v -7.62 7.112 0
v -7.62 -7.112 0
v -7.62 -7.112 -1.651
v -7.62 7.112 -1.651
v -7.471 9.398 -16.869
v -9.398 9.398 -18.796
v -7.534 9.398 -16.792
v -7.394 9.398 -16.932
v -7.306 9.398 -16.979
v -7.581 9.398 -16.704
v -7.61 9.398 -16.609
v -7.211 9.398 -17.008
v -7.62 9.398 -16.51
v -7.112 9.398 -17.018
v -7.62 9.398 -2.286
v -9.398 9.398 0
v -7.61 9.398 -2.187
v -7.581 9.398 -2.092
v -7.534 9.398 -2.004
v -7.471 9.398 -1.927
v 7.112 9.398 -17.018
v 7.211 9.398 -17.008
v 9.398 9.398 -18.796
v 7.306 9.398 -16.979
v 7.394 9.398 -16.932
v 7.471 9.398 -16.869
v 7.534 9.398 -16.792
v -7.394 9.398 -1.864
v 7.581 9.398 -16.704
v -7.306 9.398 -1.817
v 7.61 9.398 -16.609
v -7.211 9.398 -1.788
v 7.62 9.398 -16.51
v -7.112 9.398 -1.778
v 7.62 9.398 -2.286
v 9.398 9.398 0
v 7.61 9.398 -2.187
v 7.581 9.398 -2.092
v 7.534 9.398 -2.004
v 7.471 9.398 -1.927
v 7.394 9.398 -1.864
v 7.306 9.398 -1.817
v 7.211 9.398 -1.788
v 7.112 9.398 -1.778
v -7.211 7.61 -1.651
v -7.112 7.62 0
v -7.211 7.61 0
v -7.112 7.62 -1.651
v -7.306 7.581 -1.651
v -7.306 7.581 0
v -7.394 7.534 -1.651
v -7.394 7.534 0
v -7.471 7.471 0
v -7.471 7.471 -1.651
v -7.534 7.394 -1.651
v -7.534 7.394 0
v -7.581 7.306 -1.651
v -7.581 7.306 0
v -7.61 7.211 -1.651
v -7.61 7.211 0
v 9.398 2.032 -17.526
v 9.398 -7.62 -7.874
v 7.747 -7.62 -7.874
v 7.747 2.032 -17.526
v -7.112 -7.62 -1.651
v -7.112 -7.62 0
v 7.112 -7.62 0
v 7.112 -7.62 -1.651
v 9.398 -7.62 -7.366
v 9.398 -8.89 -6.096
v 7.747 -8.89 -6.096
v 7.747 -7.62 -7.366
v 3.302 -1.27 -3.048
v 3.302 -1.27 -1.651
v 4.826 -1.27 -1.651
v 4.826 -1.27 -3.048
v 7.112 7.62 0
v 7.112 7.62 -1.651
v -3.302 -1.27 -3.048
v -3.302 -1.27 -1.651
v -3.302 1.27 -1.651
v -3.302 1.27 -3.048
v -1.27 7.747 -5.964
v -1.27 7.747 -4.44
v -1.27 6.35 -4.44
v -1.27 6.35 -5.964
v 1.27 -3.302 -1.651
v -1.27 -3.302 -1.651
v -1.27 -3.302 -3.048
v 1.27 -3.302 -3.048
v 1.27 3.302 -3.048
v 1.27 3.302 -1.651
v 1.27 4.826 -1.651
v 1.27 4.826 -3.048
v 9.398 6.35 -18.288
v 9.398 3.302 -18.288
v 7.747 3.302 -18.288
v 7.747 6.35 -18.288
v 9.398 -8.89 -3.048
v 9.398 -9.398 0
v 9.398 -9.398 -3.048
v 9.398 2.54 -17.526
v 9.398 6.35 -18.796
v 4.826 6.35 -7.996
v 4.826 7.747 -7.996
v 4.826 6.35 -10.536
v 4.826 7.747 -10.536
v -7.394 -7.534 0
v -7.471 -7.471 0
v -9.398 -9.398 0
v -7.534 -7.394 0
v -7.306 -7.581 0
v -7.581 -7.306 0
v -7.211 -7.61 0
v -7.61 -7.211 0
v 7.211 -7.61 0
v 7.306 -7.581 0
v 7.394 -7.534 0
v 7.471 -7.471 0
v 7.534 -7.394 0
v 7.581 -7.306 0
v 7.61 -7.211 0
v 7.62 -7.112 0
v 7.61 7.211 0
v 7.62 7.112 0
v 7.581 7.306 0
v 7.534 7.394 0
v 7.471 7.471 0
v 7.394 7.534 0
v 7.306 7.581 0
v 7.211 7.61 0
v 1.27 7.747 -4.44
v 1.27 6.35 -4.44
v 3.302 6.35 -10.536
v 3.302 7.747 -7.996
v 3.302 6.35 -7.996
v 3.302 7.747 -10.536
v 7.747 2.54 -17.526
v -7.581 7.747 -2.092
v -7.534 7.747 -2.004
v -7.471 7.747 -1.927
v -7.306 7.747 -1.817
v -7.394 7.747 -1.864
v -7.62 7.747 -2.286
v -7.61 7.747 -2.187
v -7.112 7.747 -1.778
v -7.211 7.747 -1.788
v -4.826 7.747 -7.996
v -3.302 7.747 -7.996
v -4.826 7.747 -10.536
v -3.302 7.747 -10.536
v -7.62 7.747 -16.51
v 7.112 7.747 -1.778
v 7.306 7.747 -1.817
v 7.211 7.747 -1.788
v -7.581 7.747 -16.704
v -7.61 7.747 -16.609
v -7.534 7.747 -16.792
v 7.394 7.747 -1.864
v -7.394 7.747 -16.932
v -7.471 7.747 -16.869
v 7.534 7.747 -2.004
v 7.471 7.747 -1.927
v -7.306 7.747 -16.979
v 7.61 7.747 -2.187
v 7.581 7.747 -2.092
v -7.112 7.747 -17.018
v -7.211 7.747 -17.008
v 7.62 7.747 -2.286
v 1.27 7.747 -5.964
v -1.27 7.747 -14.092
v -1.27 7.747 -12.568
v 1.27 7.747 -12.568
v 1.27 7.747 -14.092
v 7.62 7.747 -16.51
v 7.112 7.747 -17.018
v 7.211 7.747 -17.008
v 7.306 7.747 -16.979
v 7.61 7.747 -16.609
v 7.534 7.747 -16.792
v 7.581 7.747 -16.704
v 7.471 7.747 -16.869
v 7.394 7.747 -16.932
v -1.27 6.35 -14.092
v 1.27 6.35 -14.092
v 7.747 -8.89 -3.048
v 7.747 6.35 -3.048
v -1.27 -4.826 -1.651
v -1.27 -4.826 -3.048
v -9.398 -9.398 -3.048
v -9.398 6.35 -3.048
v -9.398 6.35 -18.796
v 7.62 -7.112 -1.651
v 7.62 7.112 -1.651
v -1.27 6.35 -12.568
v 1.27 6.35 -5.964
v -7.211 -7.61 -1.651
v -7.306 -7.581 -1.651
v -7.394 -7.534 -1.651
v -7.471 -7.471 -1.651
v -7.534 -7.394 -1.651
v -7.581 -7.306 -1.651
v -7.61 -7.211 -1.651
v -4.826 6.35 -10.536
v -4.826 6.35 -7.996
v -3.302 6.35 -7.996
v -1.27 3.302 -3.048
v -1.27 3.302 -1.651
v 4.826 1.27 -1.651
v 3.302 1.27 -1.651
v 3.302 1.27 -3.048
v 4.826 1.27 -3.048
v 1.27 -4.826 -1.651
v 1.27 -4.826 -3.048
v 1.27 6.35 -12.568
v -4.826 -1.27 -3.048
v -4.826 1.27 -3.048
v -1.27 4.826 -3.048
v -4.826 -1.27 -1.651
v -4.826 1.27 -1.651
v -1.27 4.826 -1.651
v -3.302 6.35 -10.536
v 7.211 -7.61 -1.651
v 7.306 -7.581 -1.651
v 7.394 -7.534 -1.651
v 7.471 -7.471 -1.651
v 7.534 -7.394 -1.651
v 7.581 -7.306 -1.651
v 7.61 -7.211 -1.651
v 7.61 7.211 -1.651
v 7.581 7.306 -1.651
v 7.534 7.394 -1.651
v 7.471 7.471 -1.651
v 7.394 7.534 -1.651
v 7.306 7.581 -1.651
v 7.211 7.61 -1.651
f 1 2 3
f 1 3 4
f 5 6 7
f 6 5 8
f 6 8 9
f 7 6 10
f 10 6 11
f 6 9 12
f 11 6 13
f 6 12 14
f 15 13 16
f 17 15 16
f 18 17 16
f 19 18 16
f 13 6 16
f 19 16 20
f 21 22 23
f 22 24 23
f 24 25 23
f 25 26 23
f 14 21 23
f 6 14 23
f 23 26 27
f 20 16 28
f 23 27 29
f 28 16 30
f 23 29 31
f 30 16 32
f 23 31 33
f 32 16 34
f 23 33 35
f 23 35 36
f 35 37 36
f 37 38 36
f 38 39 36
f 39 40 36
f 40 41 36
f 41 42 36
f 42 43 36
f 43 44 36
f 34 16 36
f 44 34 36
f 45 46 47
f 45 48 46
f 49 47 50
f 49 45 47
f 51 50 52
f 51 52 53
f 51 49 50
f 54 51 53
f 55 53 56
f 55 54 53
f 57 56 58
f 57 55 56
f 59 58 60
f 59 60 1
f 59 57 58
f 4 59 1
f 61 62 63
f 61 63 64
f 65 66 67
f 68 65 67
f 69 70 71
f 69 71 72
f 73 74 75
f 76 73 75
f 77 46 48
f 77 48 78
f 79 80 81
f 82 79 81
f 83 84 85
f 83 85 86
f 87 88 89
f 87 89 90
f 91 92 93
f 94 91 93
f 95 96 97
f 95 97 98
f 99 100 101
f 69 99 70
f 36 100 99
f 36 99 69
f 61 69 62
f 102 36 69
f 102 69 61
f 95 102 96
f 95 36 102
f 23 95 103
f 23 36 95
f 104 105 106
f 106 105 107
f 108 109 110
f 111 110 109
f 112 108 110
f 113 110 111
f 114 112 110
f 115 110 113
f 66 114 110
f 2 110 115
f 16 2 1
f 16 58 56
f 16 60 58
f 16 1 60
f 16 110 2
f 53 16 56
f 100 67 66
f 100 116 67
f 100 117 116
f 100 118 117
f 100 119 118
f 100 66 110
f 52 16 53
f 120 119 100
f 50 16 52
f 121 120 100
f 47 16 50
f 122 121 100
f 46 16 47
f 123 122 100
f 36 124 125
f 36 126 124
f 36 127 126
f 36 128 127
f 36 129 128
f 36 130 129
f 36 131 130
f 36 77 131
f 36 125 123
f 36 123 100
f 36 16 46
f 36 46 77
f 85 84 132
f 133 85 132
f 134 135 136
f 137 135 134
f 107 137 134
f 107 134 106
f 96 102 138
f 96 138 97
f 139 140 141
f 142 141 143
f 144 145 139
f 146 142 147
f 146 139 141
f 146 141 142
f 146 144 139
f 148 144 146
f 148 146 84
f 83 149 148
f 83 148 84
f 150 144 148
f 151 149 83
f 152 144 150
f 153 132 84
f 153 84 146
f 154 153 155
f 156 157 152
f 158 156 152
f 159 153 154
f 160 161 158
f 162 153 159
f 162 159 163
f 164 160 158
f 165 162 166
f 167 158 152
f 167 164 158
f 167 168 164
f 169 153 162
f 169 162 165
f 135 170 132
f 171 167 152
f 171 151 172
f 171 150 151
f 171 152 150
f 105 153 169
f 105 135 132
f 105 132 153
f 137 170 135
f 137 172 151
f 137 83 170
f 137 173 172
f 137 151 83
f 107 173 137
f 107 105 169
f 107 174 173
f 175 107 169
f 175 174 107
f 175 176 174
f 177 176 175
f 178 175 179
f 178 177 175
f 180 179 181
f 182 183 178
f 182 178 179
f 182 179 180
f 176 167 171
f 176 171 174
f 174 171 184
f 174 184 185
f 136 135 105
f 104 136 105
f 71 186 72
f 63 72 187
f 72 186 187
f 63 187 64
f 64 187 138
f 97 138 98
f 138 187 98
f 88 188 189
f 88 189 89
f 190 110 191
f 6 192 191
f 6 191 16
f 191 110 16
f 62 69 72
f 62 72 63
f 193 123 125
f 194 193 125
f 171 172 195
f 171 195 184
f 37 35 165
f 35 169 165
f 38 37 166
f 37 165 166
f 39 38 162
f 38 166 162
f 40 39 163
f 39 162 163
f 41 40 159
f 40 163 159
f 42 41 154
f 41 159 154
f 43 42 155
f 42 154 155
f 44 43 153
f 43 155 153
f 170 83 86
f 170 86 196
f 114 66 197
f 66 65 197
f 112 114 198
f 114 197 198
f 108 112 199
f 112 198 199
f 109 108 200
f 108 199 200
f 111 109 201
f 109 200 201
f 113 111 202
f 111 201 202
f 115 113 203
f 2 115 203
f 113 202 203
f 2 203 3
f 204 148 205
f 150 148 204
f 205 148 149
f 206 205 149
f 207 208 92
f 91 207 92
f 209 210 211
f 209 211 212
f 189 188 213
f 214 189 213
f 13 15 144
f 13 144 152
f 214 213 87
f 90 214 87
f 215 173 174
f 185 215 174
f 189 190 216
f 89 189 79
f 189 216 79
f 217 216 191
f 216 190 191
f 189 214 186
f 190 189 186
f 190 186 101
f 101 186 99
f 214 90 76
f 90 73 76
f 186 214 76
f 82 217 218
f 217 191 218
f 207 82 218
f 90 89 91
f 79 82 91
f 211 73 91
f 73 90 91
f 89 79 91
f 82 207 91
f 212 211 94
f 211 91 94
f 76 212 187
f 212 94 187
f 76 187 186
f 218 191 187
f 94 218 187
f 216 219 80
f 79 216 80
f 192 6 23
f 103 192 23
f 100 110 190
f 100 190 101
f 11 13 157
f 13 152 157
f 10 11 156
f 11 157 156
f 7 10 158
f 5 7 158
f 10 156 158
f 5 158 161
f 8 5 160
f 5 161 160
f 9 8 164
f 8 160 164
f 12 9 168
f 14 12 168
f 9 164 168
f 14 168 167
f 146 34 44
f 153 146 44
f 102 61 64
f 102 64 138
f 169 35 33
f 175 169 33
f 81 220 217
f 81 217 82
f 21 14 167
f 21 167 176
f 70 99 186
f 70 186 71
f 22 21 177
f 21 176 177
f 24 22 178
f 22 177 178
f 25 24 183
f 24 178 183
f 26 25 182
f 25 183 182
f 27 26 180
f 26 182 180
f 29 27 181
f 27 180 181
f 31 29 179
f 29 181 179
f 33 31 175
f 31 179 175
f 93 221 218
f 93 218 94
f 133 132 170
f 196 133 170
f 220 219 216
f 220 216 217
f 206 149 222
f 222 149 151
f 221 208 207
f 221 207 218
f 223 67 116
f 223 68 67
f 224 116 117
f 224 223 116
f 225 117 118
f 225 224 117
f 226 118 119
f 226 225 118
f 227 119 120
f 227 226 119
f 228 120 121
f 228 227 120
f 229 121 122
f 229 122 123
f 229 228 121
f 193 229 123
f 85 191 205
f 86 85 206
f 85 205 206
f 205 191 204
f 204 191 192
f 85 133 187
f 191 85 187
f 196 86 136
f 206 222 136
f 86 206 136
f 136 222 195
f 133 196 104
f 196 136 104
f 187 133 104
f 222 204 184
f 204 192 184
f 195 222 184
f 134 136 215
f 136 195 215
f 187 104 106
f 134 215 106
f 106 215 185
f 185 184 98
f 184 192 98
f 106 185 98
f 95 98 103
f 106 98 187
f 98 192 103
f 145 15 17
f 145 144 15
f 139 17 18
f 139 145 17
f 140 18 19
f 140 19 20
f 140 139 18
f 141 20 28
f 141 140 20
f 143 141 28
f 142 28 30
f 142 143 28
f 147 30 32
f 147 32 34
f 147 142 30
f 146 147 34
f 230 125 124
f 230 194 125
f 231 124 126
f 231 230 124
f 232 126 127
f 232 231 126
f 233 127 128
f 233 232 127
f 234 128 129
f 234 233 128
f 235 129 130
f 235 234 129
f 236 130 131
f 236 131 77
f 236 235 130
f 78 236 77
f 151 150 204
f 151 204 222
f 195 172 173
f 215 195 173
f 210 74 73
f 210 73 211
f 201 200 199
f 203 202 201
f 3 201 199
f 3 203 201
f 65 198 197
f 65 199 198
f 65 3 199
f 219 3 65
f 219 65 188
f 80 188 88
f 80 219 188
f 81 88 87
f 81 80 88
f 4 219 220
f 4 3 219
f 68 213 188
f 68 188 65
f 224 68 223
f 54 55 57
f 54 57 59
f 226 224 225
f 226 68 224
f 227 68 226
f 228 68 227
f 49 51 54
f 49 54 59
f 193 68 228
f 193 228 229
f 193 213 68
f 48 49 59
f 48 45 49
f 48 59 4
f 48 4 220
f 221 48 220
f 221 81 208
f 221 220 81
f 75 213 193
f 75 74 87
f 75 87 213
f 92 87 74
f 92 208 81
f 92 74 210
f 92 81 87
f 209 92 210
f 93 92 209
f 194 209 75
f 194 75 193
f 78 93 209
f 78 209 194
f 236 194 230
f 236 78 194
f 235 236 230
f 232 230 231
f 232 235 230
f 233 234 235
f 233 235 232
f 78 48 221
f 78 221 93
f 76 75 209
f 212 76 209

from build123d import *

# Parameters (mm, degrees)
SKETCH1_W           = 18.796
SKETCH1_H           = 18.796
BOSS_EXTRUDE1_DEPTH = 3.048
SKETCH3_W           = 18.796
SKETCH3_H           = 18.796
BOSS_EXTRUDE2_DEPTH = 3.048
SKETCH4_W           = 15.24
SKETCH4_H           = 15.24
CUT_EXTRUDE1_DEPTH  = 1.651
SKETCH5_W           = 15.24
SKETCH5_H           = 15.24
CUT_EXTRUDE2_DEPTH  = 1.651
SKETCH6_W           = 2.54
SKETCH6_H           = 1.524
SKETCH6_W_2         = 1.524
SKETCH6_H_2         = 2.54
CUT_EXTRUDE3_DEPTH  = 1.651
SKETCH7_W           = 2.54
SKETCH7_H           = 1.524
SKETCH7_W_2         = 1.524
SKETCH7_H_2         = 2.54
CUT_EXTRUDE4_DEPTH  = 24.020304603
BOSS_EXTRUDE3_DEPTH = 1.651
FILLET1_R           = 0.508
FILLET2_R           = 0.508


with BuildPart() as part:
    # Sketch1 → Boss-Extrude1 (new body)
    with BuildSketch(Plane.XY):
        Rectangle(SKETCH1_W, SKETCH1_H)
    extrude(amount=-BOSS_EXTRUDE1_DEPTH)

    # Sketch3 → Boss-Extrude2 (add)
    with BuildSketch(Plane(origin=(0, 9.398, 0), x_dir=(1, 0, 0), z_dir=(0, 1, 0))):
        with Locations((0, 9.398)):
            Rectangle(SKETCH3_W, SKETCH3_H)
    extrude(amount=-BOSS_EXTRUDE2_DEPTH)

    # Sketch4 → Cut-Extrude1 (cut)
    with BuildSketch(Plane(origin=(0, 9.398, 0), x_dir=(1, 0, 0), z_dir=(0, 1, 0))):
        with Locations((0, 9.398)):
            Rectangle(SKETCH4_W, SKETCH4_H)
    extrude(amount=-CUT_EXTRUDE1_DEPTH, mode=Mode.SUBTRACT)

    # Sketch5 → Cut-Extrude2 (cut)
    with BuildSketch(Plane.XY):
        Rectangle(SKETCH5_W, SKETCH5_H)
    extrude(amount=-CUT_EXTRUDE2_DEPTH, mode=Mode.SUBTRACT)

    # Sketch6 → Cut-Extrude3 (cut)
    with BuildSketch(Plane(origin=(0, 7.747, 0), x_dir=(1, 0, 0), z_dir=(0, 1, 0))):
        with Locations((0, 5.20193254)):
            Rectangle(SKETCH6_W, SKETCH6_H)
        with Locations((-4.064, 9.26593254)):
            Rectangle(SKETCH6_W_2, SKETCH6_H_2)
        with Locations((4.064, 9.26593254)):
            Rectangle(SKETCH6_W_2, SKETCH6_H_2)
        with Locations((0, 13.32993254)):
            Rectangle(SKETCH6_W, SKETCH6_H)
    extrude(amount=-CUT_EXTRUDE3_DEPTH, mode=Mode.SUBTRACT)

    # Sketch7 → Cut-Extrude4 (cut, through all)
    with BuildSketch(Plane.XY):
        with Locations((0, 4.064)):
            Rectangle(SKETCH7_W, SKETCH7_H)
        with Locations((4.064, 0)):
            Rectangle(SKETCH7_W_2, SKETCH7_H_2)
        with Locations((0, -4.064)):
            Rectangle(SKETCH7_W, SKETCH7_H)
        with Locations((-4.064, 0)):
            Rectangle(SKETCH7_W_2, SKETCH7_H_2)
    extrude(amount=-CUT_EXTRUDE4_DEPTH, mode=Mode.SUBTRACT)

    # Sketch8 → Boss-Extrude3 (add)
    with BuildSketch(Plane(origin=(9.398, 0, 0), x_dir=(0, 0, -1), z_dir=(1, 0, 0))):
        Polygon((3.048, 6.35), (3.048, -8.89), (6.096, -8.89), (7.366, -7.62), (7.874, -7.62), (17.526, 2.032), (17.526, 2.54), (18.288, 3.302), (18.288, 6.35), align=None)
    extrude(amount=-BOSS_EXTRUDE3_DEPTH)

    # Fillet1
    fillet1_edges = [part.edges().sort_by_distance(p)[0] for p in [
        (7.62, 8.5725, -1.778),
        (-7.62, 8.5725, -1.778),
        (-7.62, 8.5725, -17.018),
        (7.62, 8.5725, -17.018),
    ]]
    fillet(fillet1_edges, radius=FILLET1_R)

    # Fillet2
    fillet2_edges = [part.edges().sort_by_distance(p)[0] for p in [
        (-7.62, -7.62, -0.8255),
        (-7.62, 7.62, -0.8255),
        (7.62, 7.62, -0.8255),
        (7.62, -7.62, -0.8255),
    ]]
    fillet(fillet2_edges, radius=FILLET2_R)


solid = part.part
